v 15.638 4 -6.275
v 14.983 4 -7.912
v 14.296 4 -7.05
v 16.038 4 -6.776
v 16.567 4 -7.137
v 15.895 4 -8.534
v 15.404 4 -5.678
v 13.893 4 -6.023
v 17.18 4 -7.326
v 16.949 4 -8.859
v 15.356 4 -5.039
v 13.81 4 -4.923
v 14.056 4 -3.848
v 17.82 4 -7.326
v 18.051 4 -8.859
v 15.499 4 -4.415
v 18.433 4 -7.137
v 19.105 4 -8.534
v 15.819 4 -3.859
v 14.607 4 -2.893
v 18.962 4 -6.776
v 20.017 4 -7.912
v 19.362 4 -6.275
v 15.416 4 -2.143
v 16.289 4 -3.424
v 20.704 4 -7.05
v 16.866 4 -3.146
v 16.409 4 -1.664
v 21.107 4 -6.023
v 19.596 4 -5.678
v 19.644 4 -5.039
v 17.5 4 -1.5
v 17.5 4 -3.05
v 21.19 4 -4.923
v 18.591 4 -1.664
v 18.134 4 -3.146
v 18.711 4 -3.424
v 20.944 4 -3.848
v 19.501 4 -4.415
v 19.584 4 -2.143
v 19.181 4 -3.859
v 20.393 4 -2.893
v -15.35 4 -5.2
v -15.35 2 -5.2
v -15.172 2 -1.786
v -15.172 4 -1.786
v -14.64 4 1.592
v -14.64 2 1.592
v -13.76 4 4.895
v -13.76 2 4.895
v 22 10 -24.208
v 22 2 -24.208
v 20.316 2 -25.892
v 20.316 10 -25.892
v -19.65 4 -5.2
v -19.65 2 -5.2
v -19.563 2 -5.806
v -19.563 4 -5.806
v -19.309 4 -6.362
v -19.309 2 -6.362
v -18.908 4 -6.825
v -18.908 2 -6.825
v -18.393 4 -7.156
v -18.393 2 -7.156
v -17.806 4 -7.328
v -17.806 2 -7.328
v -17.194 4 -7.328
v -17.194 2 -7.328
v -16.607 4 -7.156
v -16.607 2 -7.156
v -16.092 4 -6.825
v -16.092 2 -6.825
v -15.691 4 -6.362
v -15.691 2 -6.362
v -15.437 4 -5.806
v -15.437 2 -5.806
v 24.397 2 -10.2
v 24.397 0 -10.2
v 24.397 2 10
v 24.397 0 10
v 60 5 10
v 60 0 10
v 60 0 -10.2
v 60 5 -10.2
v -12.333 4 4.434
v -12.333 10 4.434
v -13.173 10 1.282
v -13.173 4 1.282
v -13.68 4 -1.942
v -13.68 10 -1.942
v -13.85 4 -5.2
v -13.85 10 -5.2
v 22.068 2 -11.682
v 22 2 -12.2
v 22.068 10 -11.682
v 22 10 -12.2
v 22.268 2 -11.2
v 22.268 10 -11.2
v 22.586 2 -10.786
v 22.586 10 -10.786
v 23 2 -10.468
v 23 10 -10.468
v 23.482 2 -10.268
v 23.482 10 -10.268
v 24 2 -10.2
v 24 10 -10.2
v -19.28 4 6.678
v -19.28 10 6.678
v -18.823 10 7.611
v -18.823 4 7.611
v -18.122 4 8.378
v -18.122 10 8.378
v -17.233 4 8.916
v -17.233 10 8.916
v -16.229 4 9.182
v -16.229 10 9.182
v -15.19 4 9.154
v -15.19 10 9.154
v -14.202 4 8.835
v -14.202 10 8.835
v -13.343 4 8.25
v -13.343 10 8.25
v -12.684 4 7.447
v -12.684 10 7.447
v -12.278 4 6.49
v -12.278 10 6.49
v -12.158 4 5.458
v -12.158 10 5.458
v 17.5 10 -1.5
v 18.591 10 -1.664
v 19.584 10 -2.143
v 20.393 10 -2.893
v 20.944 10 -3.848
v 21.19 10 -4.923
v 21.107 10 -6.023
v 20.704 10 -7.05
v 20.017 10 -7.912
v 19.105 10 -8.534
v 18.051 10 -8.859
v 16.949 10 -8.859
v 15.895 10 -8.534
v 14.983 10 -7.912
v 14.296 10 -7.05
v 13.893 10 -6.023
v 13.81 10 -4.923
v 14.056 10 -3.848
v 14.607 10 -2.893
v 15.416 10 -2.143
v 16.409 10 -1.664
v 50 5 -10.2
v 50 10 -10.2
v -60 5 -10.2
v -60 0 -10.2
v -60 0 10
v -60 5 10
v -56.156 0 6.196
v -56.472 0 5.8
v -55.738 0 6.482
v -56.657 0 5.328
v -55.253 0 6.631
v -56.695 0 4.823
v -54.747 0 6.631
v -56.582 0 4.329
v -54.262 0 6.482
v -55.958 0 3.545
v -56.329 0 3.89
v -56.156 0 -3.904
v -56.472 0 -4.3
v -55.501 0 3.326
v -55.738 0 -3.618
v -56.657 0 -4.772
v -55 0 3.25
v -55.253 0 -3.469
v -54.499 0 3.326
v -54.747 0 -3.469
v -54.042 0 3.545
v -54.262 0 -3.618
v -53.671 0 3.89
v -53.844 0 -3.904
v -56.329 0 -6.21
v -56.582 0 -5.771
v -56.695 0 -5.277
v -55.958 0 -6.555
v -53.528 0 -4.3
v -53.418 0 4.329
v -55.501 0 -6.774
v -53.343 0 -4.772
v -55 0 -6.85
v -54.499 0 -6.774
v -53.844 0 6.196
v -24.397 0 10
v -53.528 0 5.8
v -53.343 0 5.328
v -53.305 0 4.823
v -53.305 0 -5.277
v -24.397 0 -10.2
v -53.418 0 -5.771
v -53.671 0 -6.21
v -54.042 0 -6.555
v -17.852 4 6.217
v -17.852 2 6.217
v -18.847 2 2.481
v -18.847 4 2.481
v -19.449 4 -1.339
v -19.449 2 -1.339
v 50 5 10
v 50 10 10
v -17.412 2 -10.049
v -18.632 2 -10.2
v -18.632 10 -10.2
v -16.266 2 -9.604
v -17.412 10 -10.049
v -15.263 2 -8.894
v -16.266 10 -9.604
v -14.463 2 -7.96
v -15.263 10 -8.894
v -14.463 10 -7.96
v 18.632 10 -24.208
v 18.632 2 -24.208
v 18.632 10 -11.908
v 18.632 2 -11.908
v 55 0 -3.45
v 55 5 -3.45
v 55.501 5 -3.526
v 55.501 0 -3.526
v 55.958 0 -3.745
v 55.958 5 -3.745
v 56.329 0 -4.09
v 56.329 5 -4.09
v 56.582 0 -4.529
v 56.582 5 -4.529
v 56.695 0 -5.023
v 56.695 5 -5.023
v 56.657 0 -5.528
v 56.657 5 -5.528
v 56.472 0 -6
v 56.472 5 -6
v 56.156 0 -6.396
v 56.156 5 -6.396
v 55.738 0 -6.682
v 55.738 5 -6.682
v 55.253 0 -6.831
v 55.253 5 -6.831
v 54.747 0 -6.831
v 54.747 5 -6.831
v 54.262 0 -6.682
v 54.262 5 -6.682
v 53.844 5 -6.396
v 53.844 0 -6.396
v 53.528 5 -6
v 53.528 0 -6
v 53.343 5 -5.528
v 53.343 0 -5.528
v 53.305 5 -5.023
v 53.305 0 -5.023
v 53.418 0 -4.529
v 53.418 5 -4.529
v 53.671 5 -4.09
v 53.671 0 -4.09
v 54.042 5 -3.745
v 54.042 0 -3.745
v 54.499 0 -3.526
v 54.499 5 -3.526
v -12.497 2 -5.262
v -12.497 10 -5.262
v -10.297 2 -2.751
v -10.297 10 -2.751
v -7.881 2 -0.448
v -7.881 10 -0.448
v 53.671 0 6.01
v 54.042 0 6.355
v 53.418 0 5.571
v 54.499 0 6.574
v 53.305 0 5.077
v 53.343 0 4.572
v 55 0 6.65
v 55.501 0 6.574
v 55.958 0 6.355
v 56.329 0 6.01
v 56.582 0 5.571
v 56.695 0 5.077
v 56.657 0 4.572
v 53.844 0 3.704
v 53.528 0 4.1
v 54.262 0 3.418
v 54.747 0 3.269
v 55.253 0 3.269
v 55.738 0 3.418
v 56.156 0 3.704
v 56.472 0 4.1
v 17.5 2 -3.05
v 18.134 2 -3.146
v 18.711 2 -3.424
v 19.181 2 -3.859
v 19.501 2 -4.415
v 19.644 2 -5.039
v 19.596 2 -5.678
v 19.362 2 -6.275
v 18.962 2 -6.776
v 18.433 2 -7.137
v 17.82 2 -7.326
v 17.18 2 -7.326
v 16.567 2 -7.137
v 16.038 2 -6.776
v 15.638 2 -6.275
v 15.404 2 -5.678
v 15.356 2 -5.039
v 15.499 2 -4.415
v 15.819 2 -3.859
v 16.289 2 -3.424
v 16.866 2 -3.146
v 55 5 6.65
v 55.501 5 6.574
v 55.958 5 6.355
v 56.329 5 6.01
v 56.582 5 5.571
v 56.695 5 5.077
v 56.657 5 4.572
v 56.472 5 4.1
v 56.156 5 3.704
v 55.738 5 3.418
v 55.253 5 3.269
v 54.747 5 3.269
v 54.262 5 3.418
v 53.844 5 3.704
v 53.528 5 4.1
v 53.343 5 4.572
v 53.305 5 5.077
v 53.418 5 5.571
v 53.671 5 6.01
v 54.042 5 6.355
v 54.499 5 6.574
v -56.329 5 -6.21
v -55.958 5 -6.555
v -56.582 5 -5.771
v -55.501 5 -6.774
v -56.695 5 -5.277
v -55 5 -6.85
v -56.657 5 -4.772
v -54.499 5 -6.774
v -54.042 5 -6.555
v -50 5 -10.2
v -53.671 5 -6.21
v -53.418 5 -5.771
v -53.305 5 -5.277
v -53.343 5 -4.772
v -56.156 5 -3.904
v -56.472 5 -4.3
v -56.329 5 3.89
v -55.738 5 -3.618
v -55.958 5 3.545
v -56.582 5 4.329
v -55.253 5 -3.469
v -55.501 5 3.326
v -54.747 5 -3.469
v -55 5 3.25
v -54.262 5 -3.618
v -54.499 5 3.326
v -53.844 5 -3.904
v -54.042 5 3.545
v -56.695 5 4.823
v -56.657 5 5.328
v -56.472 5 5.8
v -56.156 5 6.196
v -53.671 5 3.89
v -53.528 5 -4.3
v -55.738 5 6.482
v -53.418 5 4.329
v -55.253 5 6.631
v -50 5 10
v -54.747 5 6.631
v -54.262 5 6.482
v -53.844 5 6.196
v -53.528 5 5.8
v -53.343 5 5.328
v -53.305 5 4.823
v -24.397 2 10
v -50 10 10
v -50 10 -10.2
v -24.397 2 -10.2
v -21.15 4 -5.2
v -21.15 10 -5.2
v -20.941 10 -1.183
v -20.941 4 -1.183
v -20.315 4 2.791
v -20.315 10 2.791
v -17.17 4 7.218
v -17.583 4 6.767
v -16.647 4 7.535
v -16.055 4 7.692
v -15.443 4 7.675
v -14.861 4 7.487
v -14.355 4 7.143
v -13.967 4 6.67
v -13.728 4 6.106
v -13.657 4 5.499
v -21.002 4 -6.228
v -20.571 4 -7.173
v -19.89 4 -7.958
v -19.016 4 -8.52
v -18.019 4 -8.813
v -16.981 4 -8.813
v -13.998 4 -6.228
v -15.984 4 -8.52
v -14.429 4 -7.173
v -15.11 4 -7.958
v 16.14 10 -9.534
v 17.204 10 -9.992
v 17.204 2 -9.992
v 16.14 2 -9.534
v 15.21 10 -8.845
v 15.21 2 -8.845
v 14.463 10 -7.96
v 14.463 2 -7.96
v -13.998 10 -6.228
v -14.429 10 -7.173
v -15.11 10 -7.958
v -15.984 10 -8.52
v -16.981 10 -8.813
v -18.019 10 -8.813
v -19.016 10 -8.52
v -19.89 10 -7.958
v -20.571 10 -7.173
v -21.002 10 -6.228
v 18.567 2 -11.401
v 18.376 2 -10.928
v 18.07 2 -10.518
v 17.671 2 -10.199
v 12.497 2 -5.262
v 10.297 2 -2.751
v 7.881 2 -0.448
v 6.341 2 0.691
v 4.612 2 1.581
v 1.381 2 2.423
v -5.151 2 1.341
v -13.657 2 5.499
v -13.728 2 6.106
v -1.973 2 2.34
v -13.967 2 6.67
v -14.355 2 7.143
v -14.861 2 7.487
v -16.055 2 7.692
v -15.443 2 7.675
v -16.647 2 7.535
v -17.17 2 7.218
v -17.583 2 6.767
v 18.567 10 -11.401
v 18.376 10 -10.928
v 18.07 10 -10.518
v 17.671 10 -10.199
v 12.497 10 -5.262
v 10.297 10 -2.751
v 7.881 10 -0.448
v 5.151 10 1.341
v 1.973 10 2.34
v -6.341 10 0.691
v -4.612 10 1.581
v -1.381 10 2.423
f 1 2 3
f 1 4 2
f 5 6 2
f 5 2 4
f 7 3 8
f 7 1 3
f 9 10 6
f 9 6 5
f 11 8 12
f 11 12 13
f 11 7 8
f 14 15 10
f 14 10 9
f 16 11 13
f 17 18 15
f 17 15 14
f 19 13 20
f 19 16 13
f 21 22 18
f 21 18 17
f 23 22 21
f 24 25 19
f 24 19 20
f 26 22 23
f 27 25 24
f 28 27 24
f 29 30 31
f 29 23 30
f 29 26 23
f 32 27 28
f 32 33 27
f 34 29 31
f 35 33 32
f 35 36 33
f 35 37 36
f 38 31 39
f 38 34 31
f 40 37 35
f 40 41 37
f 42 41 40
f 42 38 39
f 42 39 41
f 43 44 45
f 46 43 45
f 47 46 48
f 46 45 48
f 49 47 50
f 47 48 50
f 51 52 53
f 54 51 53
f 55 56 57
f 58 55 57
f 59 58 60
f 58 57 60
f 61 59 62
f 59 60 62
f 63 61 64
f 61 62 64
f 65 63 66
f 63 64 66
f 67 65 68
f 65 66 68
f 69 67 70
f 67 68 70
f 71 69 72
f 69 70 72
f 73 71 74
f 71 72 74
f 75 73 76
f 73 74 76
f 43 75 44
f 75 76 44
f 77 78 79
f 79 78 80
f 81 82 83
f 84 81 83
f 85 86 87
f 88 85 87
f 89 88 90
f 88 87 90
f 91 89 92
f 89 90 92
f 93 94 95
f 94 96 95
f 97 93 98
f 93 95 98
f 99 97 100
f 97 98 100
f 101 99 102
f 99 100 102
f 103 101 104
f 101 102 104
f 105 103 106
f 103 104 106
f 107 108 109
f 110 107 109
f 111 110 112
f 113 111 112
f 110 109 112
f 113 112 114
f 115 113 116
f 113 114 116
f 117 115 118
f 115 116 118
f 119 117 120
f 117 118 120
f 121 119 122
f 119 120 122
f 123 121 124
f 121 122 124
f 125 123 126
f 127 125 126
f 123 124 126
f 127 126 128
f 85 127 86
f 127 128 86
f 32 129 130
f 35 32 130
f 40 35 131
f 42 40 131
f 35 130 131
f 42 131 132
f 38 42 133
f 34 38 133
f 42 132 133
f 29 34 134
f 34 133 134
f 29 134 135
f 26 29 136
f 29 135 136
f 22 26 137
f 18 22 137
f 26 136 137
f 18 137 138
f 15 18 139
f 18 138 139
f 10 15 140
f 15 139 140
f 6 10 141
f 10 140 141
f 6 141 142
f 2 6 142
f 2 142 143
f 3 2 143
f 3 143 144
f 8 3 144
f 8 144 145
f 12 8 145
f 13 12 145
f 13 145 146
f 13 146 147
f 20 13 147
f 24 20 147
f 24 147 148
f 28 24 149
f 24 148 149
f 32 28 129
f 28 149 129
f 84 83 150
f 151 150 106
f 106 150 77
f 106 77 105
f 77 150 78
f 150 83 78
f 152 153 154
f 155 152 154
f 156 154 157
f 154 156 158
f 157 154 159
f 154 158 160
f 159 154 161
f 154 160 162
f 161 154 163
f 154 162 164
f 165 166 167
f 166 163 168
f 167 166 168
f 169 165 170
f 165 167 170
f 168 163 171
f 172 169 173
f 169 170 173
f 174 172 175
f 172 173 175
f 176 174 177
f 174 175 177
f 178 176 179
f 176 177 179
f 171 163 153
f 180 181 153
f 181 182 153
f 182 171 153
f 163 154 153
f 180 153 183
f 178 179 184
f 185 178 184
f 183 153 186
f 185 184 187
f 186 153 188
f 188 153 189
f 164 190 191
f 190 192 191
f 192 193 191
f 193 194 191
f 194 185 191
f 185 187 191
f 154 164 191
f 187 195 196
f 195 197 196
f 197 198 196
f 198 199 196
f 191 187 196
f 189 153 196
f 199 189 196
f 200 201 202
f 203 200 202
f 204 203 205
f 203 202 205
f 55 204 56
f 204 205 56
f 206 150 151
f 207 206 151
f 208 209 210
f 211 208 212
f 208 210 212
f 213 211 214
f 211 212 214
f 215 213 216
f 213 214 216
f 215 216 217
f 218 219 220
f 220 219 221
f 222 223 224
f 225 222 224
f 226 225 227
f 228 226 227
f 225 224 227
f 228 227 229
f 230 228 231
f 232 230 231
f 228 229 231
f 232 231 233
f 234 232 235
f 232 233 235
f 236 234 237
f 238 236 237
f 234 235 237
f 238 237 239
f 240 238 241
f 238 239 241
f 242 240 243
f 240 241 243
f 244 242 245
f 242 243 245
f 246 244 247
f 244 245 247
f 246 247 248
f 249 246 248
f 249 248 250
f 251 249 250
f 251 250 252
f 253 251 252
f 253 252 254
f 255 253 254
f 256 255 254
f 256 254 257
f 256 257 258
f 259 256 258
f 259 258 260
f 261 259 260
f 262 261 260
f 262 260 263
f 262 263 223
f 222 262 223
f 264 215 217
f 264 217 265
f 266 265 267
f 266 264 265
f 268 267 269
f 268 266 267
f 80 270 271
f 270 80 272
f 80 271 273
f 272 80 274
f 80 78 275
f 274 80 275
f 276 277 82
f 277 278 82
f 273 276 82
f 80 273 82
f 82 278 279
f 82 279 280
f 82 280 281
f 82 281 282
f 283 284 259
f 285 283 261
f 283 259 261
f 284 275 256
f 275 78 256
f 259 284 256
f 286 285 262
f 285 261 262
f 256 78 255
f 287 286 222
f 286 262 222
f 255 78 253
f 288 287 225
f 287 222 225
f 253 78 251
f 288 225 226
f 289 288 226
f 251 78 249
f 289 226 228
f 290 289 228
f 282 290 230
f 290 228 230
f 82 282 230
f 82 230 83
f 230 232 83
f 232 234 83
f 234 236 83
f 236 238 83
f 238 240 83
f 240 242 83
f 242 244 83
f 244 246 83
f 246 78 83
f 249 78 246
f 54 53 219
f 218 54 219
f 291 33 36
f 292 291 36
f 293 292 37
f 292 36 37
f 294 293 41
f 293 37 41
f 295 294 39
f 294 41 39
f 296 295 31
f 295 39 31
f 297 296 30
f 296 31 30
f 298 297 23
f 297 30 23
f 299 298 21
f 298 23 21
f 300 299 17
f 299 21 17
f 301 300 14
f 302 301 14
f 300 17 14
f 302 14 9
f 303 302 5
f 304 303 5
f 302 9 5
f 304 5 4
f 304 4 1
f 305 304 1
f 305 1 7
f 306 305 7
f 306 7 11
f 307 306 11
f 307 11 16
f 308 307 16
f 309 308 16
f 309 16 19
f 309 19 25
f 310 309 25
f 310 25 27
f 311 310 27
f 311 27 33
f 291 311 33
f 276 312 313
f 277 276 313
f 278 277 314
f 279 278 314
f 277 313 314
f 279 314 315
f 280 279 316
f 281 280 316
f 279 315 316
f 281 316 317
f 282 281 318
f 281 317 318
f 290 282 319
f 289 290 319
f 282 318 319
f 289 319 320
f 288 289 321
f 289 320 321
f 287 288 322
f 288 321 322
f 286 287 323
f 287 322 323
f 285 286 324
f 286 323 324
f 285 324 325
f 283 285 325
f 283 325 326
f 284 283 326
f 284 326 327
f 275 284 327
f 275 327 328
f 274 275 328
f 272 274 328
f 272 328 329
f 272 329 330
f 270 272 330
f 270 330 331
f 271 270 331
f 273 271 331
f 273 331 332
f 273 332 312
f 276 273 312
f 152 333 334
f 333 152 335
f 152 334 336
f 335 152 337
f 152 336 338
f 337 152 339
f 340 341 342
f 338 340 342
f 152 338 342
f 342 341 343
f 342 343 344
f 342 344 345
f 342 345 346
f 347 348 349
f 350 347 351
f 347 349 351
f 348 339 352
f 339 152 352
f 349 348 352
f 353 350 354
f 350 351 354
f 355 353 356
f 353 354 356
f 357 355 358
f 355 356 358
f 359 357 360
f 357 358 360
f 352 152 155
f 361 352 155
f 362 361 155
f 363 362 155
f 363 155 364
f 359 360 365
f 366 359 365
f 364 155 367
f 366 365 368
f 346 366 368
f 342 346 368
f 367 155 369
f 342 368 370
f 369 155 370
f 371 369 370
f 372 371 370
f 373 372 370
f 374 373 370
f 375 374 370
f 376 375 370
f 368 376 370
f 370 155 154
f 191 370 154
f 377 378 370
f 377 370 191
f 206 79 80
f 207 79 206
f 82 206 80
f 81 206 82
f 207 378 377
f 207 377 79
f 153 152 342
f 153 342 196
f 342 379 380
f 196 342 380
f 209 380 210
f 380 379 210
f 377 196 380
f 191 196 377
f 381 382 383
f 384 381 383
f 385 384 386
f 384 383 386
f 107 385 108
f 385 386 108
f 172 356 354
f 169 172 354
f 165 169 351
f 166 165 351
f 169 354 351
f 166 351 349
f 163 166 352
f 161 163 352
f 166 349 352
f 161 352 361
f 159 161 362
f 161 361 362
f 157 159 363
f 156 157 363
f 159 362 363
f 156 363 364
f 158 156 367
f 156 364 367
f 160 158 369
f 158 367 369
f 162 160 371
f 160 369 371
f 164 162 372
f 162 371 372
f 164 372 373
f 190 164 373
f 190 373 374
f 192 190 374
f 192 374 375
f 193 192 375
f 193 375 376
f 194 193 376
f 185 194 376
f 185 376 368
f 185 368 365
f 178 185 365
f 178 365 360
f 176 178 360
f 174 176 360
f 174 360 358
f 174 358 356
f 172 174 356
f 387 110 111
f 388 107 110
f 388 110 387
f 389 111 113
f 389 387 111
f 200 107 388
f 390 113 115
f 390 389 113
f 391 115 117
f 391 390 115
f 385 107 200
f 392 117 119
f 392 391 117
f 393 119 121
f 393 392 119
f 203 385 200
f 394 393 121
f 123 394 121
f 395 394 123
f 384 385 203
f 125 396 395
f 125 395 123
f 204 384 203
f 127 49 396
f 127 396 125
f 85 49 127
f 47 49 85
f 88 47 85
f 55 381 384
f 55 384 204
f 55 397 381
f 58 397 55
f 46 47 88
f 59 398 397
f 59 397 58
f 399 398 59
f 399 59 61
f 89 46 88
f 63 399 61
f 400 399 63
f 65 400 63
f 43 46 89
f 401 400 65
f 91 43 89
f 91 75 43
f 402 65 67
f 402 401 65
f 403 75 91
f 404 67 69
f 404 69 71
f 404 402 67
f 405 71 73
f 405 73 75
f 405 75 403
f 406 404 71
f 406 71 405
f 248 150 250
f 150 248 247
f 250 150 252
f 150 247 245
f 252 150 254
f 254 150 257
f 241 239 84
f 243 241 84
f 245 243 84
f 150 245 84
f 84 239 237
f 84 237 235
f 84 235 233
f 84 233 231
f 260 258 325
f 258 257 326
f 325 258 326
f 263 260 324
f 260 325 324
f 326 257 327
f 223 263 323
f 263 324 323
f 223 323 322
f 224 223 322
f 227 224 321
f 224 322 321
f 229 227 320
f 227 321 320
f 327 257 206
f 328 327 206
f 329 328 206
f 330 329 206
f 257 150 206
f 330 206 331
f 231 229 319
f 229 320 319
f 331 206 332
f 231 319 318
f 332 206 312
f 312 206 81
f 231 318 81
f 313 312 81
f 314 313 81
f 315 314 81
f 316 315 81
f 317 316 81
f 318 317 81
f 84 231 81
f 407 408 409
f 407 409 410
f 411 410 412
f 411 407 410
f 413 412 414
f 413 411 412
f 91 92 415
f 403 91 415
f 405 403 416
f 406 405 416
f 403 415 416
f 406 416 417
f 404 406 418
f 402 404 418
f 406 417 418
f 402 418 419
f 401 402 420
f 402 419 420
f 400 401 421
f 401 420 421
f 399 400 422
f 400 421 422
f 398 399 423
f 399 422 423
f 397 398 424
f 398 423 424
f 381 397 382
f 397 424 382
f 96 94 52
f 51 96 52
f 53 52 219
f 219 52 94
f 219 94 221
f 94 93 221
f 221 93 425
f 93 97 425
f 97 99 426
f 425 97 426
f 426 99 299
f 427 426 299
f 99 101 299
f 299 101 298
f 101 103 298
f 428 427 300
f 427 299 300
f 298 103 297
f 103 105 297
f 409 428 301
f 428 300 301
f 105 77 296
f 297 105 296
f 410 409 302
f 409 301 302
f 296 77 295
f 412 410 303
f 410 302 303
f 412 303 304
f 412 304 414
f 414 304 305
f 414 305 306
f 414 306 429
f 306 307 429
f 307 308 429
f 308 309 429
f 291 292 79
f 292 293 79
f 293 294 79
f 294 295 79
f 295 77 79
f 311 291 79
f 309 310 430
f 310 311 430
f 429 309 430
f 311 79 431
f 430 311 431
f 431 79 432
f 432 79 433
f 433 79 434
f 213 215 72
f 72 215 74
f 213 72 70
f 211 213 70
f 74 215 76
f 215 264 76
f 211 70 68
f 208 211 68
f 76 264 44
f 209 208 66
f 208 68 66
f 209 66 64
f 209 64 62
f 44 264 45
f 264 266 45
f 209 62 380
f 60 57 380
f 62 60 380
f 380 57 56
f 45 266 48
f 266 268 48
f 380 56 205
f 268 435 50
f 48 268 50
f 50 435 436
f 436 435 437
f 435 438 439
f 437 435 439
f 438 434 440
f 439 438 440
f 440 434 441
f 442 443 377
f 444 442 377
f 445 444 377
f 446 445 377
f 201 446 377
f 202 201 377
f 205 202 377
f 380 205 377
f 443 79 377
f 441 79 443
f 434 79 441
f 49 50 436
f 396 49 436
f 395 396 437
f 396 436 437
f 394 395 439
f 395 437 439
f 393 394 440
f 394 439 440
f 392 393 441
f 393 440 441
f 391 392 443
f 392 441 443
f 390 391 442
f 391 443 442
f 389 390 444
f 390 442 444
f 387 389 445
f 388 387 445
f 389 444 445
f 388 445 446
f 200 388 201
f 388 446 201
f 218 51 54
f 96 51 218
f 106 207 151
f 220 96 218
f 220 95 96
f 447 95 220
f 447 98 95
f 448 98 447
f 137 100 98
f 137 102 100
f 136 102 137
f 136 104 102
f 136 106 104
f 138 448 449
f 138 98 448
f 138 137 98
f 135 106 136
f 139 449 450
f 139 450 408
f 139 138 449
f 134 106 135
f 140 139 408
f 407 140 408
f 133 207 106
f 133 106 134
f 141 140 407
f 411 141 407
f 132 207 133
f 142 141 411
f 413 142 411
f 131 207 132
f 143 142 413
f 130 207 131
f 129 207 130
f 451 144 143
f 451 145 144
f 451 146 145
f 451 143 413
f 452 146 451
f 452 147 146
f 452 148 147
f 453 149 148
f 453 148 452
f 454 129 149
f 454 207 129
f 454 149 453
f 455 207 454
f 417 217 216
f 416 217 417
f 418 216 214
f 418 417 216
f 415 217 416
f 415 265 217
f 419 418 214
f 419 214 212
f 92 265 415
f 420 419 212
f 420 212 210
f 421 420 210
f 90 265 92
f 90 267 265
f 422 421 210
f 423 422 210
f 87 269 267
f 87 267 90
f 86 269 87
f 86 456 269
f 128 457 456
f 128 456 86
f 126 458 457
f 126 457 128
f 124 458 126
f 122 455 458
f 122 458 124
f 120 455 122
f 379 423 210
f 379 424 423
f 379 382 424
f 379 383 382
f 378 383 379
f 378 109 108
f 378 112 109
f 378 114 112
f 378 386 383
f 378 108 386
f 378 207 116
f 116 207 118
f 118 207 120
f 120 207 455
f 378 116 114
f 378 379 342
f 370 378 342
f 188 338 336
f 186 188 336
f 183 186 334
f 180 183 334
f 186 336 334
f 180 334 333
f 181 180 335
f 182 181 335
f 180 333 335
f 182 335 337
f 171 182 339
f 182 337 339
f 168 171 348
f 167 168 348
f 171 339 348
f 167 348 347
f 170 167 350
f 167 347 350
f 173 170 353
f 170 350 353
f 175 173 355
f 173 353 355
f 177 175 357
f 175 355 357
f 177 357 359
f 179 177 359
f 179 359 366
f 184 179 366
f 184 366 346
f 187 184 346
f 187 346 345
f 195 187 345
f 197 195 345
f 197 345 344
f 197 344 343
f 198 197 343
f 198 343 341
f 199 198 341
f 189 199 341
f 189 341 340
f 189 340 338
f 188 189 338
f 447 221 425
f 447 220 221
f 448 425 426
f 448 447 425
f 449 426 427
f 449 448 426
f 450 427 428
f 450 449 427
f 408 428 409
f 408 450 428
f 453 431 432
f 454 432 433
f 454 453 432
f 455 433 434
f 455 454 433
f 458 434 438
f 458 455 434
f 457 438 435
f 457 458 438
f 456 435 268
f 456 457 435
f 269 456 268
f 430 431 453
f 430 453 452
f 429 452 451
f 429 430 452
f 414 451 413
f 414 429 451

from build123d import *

# Parameters (mm, degrees)
AUFSATZ_LINEAR_AUSTRAGEN1_DEPTH  = 10
AUFSATZ_LINEAR_START             = 2
AUFSATZ_LINEAR_AUSTRAGEN2_DEPTH  = 2
SKIZZE3_R                        = 2.15
SCHNITT_LINEAR_AUSTRAGEN1_DEPTH  = 63.032572089
SKIZZE5_R                        = 3.7
SKIZZE5_R_2                      = 2.15
SCHNITT_LINEAR_AUSTRAGEN3_DEPTH  = 6
VERRUNDUNG3_START                = -11
VERRUNDUNG3_DEPTH                = 12
VERRUNDUNG3_START_2              = -10.2
VERRUNDUNG3_2_DEPTH              = 10.2
SKIZZE9_W                        = 10
SKIZZE9_H                        = 5
SCHNITT_LINEAR_AUSTRAGEN6_DEPTH  = 62.676900052
SKIZZE10_W                       = 10
SKIZZE10_H                       = 10
AUFSATZ_LINEAR_AUSTRAGEN3_DEPTH  = 5
AUFSATZ_LINEAR_AUSTRAGEN4_DEPTH  = 10
SKIZZE12_R                       = 1.7
SCHNITT_LINEAR_AUSTRAGEN7_DEPTH  = 62.262060037
SCHNITT_LINEAR_AUSTRAGEN8_DEPTH  = 63.032572089
SCHNITT_LINEAR_AUSTRAGEN10_DEPTH = 63.032572089
VERRUNDUNG6_R                    = 5
VERRUNDUNG7_R                    = 12
SCHNITT_LINEAR_AUSTRAGEN11_DEPTH = 6
SKIZZE19_W                       = 48.79312263
SKIZZE19_H                       = 28.151116142
SCHNITT_LINEAR_AUSTRAGEN12_DEPTH = 4
AUFSATZ_LINEAR_AUSTRAGEN6_DEPTH  = 8
VERRUNDUNG8_R                    = 2


with BuildPart() as part:
    # Skizze1 → Aufsatz-Linear austragen1 (new body)
    with BuildSketch(Plane(origin=(0, 0, 0), x_dir=(1, 0, 0), z_dir=(0, 1, 0))):
        with BuildLine():
            Line((-60, 0), (60, 0))
            Line((60, 0), (60, 10.2))
            Line((60, 10.2), (14.486956443, 10.2))
            ThreePointArc((14.486956443, 10.2), (7.840151577, 5.759336515), (0, 4.2))
            ThreePointArc((0, 4.2), (-7.840151577, 5.759336515), (-14.486956443, 10.2))
            Line((-14.486956443, 10.2), (-60, 10.2))
            Line((-60, 10.2), (-60, 0))
        make_face()
    extrude(amount=AUFSATZ_LINEAR_AUSTRAGEN1_DEPTH)

    # Skizze7 → Aufsatz-Linear austragen2 (add)
    with BuildSketch(Plane.XZ.offset(AUFSATZ_LINEAR_START)):
        with BuildLine():
            Line((23, 0), (23, -10.2))
            Line((23, -10.2), (14.486956443, -10.2))
            ThreePointArc((14.486956443, -10.2), (0, -4.2), (-14.486956443, -10.2))
            Line((-14.486956443, -10.2), (-23, -10.2))
            Line((-23, -10.2), (-23, 0))
            Line((-23, 0), (23, 0))
        make_face()
    extrude(amount=-AUFSATZ_LINEAR_AUSTRAGEN2_DEPTH)

    # Skizze3 → Schnitt-Linear austragen1 (cut, through all)
    with BuildSketch(Plane(origin=(0, 10, 0), x_dir=(1, 0, 0), z_dir=(0, 1, 0))):
        with Locations(Location((17.5, 5.2, 0), (0, 0, 270))):
            Circle(SKIZZE3_R)
    extrude(amount=-SCHNITT_LINEAR_AUSTRAGEN1_DEPTH, mode=Mode.SUBTRACT)

    # Skizze5 → Schnitt-Linear austragen3 (cut)
    with BuildSketch(Plane(origin=(0, 10, 0), x_dir=(1, 0, 0), z_dir=(0, 1, 0))):
        with Locations(Location((17.5, 5.2, 0), (0, 0, 270))):
            Circle(SKIZZE5_R)
        with Locations(Location((17.5, 5.2, 0), (0, 0, 270))):
            Circle(SKIZZE5_R_2, mode=Mode.SUBTRACT)
    extrude(amount=-SCHNITT_LINEAR_AUSTRAGEN3_DEPTH, mode=Mode.SUBTRACT)

    # Verrundung3: read off the stored shape, not the designer's step
    # Verrundung3 outline → Verrundung3 (cut)
    with BuildSketch(Plane.XY.offset(VERRUNDUNG3_START)):
        with BuildLine():
            ThreePointArc((23, -1), (22.707106781, -1.707106781), (22, -2))
            Line((22, -2), (23, -2))
            Line((23, -2), (23, -1))
        make_face()
        with BuildLine():
            ThreePointArc((-22, -2), (-22.707106781, -1.707106781), (-23, -1))
            Line((-23, -1), (-23, -2))
            Line((-23, -2), (-22, -2))
        make_face()
    extrude(amount=VERRUNDUNG3_DEPTH, mode=Mode.SUBTRACT)

    # Verrundung3 2 outline → Verrundung3 2 (add)
    with BuildSketch(Plane.XY.offset(VERRUNDUNG3_START_2)):
        with BuildLine():
            Line((-23, 0), (-24, 0))
            ThreePointArc((-24, 0), (-23.292893219, -0.292893219), (-23, -1))
            Line((-23, -1), (-23, 0))
        make_face()
        with BuildLine():
            Line((23, 0), (23, -1))
            ThreePointArc((23, -1), (23.292893219, -0.292893219), (24, 0))
            Line((24, 0), (23, 0))
        make_face()
    extrude(amount=VERRUNDUNG3_2_DEPTH)

    # Skizze9 → Schnitt-Linear austragen6 (cut, through all)
    with BuildSketch(Plane.XY):
        with Locations((-55, 7.5)):
            Rectangle(SKIZZE9_W, SKIZZE9_H)
        with Locations((55, 7.5)):
            Rectangle(SKIZZE9_W, SKIZZE9_H)
    extrude(amount=-SCHNITT_LINEAR_AUSTRAGEN6_DEPTH, mode=Mode.SUBTRACT)

    # Skizze10 → Aufsatz-Linear austragen3 (add)
    with BuildSketch(Plane.XZ):
        with Locations((-55, 5)):
            Rectangle(SKIZZE10_W, SKIZZE10_H)
        with Locations((55, 5)):
            Rectangle(SKIZZE10_W, SKIZZE10_H)
    extrude(amount=-AUFSATZ_LINEAR_AUSTRAGEN3_DEPTH)

    # Skizze11 → Aufsatz-Linear austragen4 (add)
    with BuildSketch(Plane.XY):
        with BuildLine():
            Line((-50, 10), (-50, 0))
            Line((-50, 0), (-24, 0))
            ThreePointArc((-24, 0), (-23.292893219, -0.292893219), (-23, -1))
            ThreePointArc((-23, -1), (-22.707106781, -1.707106781), (-22, -2))
            Line((-22, -2), (22, -2))
            ThreePointArc((22, -2), (22.707106781, -1.707106781), (23, -1))
            ThreePointArc((23, -1), (23.292893219, -0.292893219), (24, 0))
            Line((24, 0), (50, 0))
            Line((50, 0), (50, 10))
            Line((50, 10), (-50, 10))
        make_face()
    extrude(amount=AUFSATZ_LINEAR_AUSTRAGEN4_DEPTH)

    # Skizze12 → Schnitt-Linear austragen7 (cut, through all)
    with BuildSketch(Plane(origin=(0, 5, 0), x_dir=(1, 0, 0), z_dir=(0, 1, 0))):
        with Locations(Location((55, 5.15, 0), (0, 0, 270))):
            Circle(SKIZZE12_R)
        with Locations(Location((55, -4.95, 0), (0, 0, 270))):
            Circle(SKIZZE12_R)
        with Locations(Location((-55, -4.95, 0), (0, 0, 90))):
            Circle(SKIZZE12_R)
        with Locations(Location((-55, 5.15, 0), (0, 0, 90))):
            Circle(SKIZZE12_R)
    extrude(amount=-SCHNITT_LINEAR_AUSTRAGEN7_DEPTH, mode=Mode.SUBTRACT)

    # Skizze14 → Schnitt-Linear austragen8 (cut, through all)
    with BuildSketch(Plane.XZ.offset(2)):
        with BuildLine():
            ThreePointArc((-17.852169734, 6.216943335), (-19.197790162, 0.578814515), (-19.65, -5.2))
            ThreePointArc((-19.65, -5.2), (-17.5, -7.35), (-15.35, -5.2))
            ThreePointArc((-15.35, -5.2), (-14.950132082, -0.090065766), (-13.760263143, 4.895466718))
            ThreePointArc((-13.760263143, 4.895466718), (-15.145478129, 7.602158322), (-17.852169734, 6.216943335))
        make_face()
    extrude(amount=-SCHNITT_LINEAR_AUSTRAGEN8_DEPTH, mode=Mode.SUBTRACT)

    # Skizze15 → Schnitt-Linear austragen10 (cut, through all)
    with BuildSketch(Plane.XZ.offset(2)):
        with BuildLine():
            Line((15.834683057, -10.2), (10.771946853, -14.532947046))
            Line((10.771946853, -14.532947046), (0, -16.110649456))
            Line((0, -16.110649456), (-10.771946853, -14.532947046))
            Line((-10.771946853, -14.532947046), (-15.834683057, -10.2))
            ThreePointArc((-15.834683057, -10.2), (-9.044172408, -1.504818286), (0, 4.813422401))
            ThreePointArc((0, 4.813422401), (9.044172408, -1.504818286), (15.834683057, -10.2))
        make_face()
    extrude(amount=-SCHNITT_LINEAR_AUSTRAGEN10_DEPTH, mode=Mode.SUBTRACT)

    # Verrundung6
    verrundung6_edges = [part.edges().sort_by_distance(p)[0] for p in [
        (15.834683057, 4, -10.2),
        (-15.834683057, 4, -10.2),
    ]]
    fillet(verrundung6_edges, radius=VERRUNDUNG6_R)

    # Verrundung7
    verrundung7_edges = [part.edges().sort_by_distance(p)[0] for p in [
        (0, 4, 4.813422401),
    ]]
    fillet(verrundung7_edges, radius=VERRUNDUNG7_R)

    # Skizze16 → Schnitt-Linear austragen11 (cut)
    with BuildSketch(Plane(origin=(0, 10, 0), x_dir=(1, 0, 0), z_dir=(0, 1, 0))):
        with BuildLine():
            ThreePointArc((-21.15, 5.2), (-20.679531353, -0.812144845), (-19.27957901, -6.677923551))
            ThreePointArc((-19.27957901, -6.677923551), (-14.684497914, -9.029567598), (-12.332853867, -4.434486502))
            ThreePointArc((-12.332853867, -4.434486502), (-13.468390891, 0.323396096), (-13.85, 5.2))
            ThreePointArc((-13.85, 5.2), (-17.5, 8.85), (-21.15, 5.2))
        make_face()
    extrude(amount=-SCHNITT_LINEAR_AUSTRAGEN11_DEPTH, mode=Mode.SUBTRACT)

    # Skizze19 → Schnitt-Linear austragen12 (cut)
    with BuildSketch(Plane.XZ.offset(2)):
        Rectangle(SKIZZE19_W, SKIZZE19_H)
    extrude(amount=-SCHNITT_LINEAR_AUSTRAGEN12_DEPTH, mode=Mode.SUBTRACT)

    # Skizze18 → Aufsatz-Linear austragen6 (add)
    with BuildSketch(Plane.XZ.offset(-2)):
        Polygon((22, -10.2), (22, -24.207768556), (20.316248486, -25.89152007), (18.632496972, -24.207768556), (18.632496972, -10.2), align=None)
    extrude(amount=-AUFSATZ_LINEAR_AUSTRAGEN6_DEPTH)

    # Verrundung8
    verrundung8_edges = [part.edges().sort_by_distance(p)[0] for p in [
        (18.632496972, 6, -10.2),
        (22, 6, -10.2),
    ]]
    fillet(verrundung8_edges, radius=VERRUNDUNG8_R)


solid = part.part
